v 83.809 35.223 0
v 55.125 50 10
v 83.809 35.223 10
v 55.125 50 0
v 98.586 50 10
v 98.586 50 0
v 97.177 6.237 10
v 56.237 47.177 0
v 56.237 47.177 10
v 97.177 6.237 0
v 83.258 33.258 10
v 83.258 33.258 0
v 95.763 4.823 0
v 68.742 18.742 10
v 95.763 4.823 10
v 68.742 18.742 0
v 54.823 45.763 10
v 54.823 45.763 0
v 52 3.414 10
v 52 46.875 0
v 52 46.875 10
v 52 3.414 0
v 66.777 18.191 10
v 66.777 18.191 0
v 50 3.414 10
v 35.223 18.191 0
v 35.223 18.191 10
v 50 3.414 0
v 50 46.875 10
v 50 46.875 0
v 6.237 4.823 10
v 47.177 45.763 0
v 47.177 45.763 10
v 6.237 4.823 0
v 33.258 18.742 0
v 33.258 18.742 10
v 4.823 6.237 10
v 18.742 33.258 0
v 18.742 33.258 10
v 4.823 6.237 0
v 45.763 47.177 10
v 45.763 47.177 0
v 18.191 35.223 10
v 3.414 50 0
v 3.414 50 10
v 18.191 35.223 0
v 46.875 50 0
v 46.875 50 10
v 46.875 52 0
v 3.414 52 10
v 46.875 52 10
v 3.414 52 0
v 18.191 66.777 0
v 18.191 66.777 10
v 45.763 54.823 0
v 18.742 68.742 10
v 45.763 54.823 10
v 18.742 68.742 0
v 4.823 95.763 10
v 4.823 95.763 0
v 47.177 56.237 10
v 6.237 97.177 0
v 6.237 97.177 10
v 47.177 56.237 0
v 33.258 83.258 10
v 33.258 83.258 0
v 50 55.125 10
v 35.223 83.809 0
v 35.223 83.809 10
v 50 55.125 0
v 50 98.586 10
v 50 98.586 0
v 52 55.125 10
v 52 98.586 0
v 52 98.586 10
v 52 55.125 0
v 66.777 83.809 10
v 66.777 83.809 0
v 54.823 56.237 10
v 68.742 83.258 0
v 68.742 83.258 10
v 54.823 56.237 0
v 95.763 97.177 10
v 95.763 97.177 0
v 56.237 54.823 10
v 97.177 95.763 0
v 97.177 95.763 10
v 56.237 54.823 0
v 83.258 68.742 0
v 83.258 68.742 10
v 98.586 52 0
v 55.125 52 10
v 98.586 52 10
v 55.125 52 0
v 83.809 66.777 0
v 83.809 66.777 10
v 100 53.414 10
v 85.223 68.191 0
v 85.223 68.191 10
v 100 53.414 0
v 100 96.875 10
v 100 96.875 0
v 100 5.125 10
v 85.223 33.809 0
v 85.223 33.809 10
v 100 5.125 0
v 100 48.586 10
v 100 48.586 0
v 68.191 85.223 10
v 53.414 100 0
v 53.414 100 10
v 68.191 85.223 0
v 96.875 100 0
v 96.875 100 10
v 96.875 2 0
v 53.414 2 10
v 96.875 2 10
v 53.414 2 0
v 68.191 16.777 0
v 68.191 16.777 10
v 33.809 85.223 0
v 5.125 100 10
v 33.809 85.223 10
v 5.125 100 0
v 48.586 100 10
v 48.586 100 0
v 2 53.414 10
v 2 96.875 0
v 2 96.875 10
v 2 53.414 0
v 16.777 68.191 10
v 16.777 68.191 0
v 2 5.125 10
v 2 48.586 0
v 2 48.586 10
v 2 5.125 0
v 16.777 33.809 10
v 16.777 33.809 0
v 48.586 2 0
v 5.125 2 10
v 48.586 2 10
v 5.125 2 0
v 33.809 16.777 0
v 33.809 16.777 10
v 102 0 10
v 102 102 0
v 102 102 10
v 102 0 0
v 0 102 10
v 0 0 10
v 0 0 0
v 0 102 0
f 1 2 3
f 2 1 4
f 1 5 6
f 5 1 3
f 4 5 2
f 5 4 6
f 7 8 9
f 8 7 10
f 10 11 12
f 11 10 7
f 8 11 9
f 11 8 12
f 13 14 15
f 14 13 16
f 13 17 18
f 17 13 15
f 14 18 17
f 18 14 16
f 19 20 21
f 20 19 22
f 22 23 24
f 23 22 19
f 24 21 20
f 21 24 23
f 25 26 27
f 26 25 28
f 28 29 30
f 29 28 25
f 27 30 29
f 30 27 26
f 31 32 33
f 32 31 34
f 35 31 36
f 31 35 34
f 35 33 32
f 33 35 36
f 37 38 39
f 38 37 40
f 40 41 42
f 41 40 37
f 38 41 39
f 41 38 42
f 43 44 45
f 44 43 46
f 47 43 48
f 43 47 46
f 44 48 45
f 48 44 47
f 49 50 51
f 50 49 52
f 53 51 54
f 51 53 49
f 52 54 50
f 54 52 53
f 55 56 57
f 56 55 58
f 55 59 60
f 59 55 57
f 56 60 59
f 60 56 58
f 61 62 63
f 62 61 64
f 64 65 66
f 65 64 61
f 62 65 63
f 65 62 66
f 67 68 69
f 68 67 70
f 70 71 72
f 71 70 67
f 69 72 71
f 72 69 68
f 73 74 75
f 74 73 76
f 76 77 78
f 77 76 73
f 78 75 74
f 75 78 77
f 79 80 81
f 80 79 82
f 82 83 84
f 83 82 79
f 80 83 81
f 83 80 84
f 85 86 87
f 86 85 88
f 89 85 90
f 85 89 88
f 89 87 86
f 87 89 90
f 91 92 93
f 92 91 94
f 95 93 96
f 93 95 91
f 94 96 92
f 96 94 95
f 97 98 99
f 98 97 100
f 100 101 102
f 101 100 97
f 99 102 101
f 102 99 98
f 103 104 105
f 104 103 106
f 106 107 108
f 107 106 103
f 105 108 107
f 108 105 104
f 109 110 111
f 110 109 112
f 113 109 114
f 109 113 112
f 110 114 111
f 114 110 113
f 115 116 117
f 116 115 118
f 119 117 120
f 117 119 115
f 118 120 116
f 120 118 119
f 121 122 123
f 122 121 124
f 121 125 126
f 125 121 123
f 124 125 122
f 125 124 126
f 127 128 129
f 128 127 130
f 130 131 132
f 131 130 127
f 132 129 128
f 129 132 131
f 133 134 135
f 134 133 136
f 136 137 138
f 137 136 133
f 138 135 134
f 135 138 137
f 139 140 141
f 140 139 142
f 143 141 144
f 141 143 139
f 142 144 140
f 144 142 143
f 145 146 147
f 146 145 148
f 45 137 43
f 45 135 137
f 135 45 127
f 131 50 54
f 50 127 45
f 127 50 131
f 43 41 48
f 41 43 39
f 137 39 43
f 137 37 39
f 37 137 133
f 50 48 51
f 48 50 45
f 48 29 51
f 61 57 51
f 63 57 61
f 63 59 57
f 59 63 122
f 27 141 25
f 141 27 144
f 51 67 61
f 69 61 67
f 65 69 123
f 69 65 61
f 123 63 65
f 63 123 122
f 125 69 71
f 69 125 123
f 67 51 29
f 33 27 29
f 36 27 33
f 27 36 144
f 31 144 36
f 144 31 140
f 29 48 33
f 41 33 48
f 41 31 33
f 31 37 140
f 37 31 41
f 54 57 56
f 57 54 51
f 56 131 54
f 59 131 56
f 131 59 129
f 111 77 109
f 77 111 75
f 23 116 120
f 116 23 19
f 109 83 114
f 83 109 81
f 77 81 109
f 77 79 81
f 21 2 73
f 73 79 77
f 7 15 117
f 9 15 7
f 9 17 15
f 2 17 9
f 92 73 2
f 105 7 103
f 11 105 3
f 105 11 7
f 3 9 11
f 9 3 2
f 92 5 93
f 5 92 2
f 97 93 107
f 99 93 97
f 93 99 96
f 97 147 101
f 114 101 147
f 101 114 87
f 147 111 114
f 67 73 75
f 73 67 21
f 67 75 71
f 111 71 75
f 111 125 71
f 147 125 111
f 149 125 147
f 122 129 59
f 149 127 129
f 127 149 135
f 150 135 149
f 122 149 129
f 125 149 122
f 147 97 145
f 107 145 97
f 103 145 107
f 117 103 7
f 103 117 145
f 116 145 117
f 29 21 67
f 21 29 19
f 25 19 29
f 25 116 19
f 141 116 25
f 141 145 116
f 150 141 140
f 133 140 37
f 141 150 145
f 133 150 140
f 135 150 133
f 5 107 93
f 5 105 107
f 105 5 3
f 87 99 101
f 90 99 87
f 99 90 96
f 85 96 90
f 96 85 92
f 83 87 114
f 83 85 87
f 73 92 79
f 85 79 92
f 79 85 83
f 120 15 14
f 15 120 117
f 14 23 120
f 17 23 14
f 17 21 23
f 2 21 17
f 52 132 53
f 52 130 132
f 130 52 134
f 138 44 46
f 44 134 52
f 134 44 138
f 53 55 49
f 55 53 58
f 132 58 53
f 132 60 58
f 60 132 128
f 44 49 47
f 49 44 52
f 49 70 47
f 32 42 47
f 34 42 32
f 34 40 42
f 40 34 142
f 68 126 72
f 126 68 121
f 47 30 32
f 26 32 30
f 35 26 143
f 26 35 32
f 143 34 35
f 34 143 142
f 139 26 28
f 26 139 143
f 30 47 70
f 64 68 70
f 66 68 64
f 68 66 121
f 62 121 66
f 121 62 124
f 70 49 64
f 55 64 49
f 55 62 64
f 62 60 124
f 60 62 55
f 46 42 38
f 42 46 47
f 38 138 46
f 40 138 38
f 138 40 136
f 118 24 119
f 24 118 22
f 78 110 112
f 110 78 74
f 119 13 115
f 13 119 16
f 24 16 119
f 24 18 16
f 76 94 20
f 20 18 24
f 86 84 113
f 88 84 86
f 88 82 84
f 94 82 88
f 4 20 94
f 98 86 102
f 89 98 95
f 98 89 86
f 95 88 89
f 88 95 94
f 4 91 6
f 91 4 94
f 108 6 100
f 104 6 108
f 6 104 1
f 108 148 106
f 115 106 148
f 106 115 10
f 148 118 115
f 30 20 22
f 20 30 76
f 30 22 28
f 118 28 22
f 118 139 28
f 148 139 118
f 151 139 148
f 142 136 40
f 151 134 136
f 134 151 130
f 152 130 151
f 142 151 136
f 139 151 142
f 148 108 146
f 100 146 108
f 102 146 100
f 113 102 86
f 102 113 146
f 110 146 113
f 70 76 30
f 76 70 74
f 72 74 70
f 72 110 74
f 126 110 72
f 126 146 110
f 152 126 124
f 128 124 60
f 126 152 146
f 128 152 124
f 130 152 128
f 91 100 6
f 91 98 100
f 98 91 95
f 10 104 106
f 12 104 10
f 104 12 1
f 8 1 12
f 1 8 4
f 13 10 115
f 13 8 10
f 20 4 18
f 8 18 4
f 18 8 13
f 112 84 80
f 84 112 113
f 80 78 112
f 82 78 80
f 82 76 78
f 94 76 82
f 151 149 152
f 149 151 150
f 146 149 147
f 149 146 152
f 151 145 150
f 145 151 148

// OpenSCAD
union() {
	difference() {
		cube(size = [102, 102, 10]);
		translate(v = [1.0000000000, 1.0000000000, -1]) {
			linear_extrude(height = 12) {
				union() {
					polygon(paths = [[0, 1, 2]], points = [[97.5857864376, 49.0000000000], [54.1247895518, 49.0000000000], [82.8090474964, 34.2232610588]]);
				}
			}
			linear_extrude(height = 12) {
				union() {
					polygon(paths = [[0, 1, 2]], points = [[82.2575715524, 32.2575715524], [55.2369043711, 46.1773091913], [96.1773091913, 5.2369043711]]);
				}
			}
			linear_extrude(height = 12) {
				union() {
					polygon(paths = [[0, 1, 2]], points = [[53.8226908087, 44.7630956289], [67.7424284476, 17.7424284476], [94.7630956289, 3.8226908087]]);
				}
			}
			linear_extrude(height = 12) {
				union() {
					polygon(paths = [[0, 1, 2]], points = [[65.7767389412, 17.1909525036], [51.0000000000, 45.8752104482], [51.0000000000, 2.4142135624]]);
				}
			}
			linear_extrude(height = 12) {
				union() {
					polygon(paths = [[0, 1, 2]], points = [[49.0000000000, 45.8752104482], [34.2232610588, 17.1909525036], [49.0000000000, 2.4142135624]]);
				}
			}
			linear_extrude(height = 12) {
				union() {
					polygon(paths = [[0, 1, 2]], points = [[32.2575715524, 17.7424284476], [46.1773091913, 44.7630956289], [5.2369043711, 3.8226908087]]);
				}
			}
			linear_extrude(height = 12) {
				union() {
					polygon(paths = [[0, 1, 2]], points = [[44.7630956289, 46.1773091913], [17.7424284476, 32.2575715524], [3.8226908087, 5.2369043711]]);
				}
			}
			linear_extrude(height = 12) {
				union() {
					polygon(paths = [[0, 1, 2]], points = [[45.8752104482, 49.0000000000], [2.4142135624, 49.0000000000], [17.1909525036, 34.2232610588]]);
				}
			}
			linear_extrude(height = 12) {
				union() {
					polygon(paths = [[0, 1, 2]], points = [[17.1909525036, 65.7767389412], [2.4142135624, 51.0000000000], [45.8752104482, 51.0000000000]]);
				}
			}
			linear_extrude(height = 12) {
				union() {
					polygon(paths = [[0, 1, 2]], points = [[3.8226908087, 94.7630956289], [17.7424284476, 67.7424284476], [44.7630956289, 53.8226908087]]);
				}
			}
			linear_extrude(height = 12) {
				union() {
					polygon(paths = [[0, 1, 2]], points = [[32.2575715524, 82.2575715524], [5.2369043711, 96.1773091913], [46.1773091913, 55.2369043711]]);
				}
			}
			linear_extrude(height = 12) {
				union() {
					polygon(paths = [[0, 1, 2]], points = [[49.0000000000, 97.5857864376], [34.2232610588, 82.8090474964], [49.0000000000, 54.1247895518]]);
				}
			}
			linear_extrude(height = 12) {
				union() {
					polygon(paths = [[0, 1, 2]], points = [[65.7767389412, 82.8090474964], [51.0000000000, 97.5857864376], [51.0000000000, 54.1247895518]]);
				}
			}
			linear_extrude(height = 12) {
				union() {
					polygon(paths = [[0, 1, 2]], points = [[94.7630956289, 96.1773091913], [67.7424284476, 82.2575715524], [53.8226908087, 55.2369043711]]);
				}
			}
			linear_extrude(height = 12) {
				union() {
					polygon(paths = [[0, 1, 2]], points = [[82.2575715524, 67.7424284476], [96.1773091913, 94.7630956289], [55.2369043711, 53.8226908087]]);
				}
			}
			linear_extrude(height = 12) {
				union() {
					polygon(paths = [[0, 1, 2]], points = [[82.8090474964, 65.7767389412], [54.1247895518, 51.0000000000], [97.5857864376, 51.0000000000]]);
				}
			}
			linear_extrude(height = 12) {
				union() {
					polygon(paths = [[0, 1, 2]], points = [[99.0000000000, 95.8752104482], [84.2232610588, 67.1909525036], [99.0000000000, 52.4142135624]]);
				}
			}
			linear_extrude(height = 12) {
				union() {
					polygon(paths = [[0, 1, 2]], points = [[99.0000000000, 47.5857864376], [84.2232610588, 32.8090474964], [99.0000000000, 4.1247895518]]);
				}
			}
			linear_extrude(height = 12) {
				union() {
					polygon(paths = [[0, 1, 2]], points = [[95.8752104482, 99.0000000000], [52.4142135624, 99.0000000000], [67.1909525036, 84.2232610588]]);
				}
			}
			linear_extrude(height = 12) {
				union() {
					polygon(paths = [[0, 1, 2]], points = [[67.1909525036, 15.7767389412], [52.4142135624, 1.0000000000], [95.8752104482, 1.0000000000]]);
				}
			}
			linear_extrude(height = 12) {
				union() {
					polygon(paths = [[0, 1, 2]], points = [[47.5857864376, 99.0000000000], [4.1247895518, 99.0000000000], [32.8090474964, 84.2232610588]]);
				}
			}
			linear_extrude(height = 12) {
				union() {
					polygon(paths = [[0, 1, 2]], points = [[15.7767389412, 67.1909525036], [1.0000000000, 95.8752104482], [1.0000000000, 52.4142135624]]);
				}
			}
			linear_extrude(height = 12) {
				union() {
					polygon(paths = [[0, 1, 2]], points = [[15.7767389412, 32.8090474964], [1.0000000000, 47.5857864376], [1.0000000000, 4.1247895518]]);
				}
			}
			linear_extrude(height = 12) {
				union() {
					polygon(paths = [[0, 1, 2]], points = [[32.8090474964, 15.7767389412], [4.1247895518, 1.0000000000], [47.5857864376, 1.0000000000]]);
				}
			}
		}
	}
}
